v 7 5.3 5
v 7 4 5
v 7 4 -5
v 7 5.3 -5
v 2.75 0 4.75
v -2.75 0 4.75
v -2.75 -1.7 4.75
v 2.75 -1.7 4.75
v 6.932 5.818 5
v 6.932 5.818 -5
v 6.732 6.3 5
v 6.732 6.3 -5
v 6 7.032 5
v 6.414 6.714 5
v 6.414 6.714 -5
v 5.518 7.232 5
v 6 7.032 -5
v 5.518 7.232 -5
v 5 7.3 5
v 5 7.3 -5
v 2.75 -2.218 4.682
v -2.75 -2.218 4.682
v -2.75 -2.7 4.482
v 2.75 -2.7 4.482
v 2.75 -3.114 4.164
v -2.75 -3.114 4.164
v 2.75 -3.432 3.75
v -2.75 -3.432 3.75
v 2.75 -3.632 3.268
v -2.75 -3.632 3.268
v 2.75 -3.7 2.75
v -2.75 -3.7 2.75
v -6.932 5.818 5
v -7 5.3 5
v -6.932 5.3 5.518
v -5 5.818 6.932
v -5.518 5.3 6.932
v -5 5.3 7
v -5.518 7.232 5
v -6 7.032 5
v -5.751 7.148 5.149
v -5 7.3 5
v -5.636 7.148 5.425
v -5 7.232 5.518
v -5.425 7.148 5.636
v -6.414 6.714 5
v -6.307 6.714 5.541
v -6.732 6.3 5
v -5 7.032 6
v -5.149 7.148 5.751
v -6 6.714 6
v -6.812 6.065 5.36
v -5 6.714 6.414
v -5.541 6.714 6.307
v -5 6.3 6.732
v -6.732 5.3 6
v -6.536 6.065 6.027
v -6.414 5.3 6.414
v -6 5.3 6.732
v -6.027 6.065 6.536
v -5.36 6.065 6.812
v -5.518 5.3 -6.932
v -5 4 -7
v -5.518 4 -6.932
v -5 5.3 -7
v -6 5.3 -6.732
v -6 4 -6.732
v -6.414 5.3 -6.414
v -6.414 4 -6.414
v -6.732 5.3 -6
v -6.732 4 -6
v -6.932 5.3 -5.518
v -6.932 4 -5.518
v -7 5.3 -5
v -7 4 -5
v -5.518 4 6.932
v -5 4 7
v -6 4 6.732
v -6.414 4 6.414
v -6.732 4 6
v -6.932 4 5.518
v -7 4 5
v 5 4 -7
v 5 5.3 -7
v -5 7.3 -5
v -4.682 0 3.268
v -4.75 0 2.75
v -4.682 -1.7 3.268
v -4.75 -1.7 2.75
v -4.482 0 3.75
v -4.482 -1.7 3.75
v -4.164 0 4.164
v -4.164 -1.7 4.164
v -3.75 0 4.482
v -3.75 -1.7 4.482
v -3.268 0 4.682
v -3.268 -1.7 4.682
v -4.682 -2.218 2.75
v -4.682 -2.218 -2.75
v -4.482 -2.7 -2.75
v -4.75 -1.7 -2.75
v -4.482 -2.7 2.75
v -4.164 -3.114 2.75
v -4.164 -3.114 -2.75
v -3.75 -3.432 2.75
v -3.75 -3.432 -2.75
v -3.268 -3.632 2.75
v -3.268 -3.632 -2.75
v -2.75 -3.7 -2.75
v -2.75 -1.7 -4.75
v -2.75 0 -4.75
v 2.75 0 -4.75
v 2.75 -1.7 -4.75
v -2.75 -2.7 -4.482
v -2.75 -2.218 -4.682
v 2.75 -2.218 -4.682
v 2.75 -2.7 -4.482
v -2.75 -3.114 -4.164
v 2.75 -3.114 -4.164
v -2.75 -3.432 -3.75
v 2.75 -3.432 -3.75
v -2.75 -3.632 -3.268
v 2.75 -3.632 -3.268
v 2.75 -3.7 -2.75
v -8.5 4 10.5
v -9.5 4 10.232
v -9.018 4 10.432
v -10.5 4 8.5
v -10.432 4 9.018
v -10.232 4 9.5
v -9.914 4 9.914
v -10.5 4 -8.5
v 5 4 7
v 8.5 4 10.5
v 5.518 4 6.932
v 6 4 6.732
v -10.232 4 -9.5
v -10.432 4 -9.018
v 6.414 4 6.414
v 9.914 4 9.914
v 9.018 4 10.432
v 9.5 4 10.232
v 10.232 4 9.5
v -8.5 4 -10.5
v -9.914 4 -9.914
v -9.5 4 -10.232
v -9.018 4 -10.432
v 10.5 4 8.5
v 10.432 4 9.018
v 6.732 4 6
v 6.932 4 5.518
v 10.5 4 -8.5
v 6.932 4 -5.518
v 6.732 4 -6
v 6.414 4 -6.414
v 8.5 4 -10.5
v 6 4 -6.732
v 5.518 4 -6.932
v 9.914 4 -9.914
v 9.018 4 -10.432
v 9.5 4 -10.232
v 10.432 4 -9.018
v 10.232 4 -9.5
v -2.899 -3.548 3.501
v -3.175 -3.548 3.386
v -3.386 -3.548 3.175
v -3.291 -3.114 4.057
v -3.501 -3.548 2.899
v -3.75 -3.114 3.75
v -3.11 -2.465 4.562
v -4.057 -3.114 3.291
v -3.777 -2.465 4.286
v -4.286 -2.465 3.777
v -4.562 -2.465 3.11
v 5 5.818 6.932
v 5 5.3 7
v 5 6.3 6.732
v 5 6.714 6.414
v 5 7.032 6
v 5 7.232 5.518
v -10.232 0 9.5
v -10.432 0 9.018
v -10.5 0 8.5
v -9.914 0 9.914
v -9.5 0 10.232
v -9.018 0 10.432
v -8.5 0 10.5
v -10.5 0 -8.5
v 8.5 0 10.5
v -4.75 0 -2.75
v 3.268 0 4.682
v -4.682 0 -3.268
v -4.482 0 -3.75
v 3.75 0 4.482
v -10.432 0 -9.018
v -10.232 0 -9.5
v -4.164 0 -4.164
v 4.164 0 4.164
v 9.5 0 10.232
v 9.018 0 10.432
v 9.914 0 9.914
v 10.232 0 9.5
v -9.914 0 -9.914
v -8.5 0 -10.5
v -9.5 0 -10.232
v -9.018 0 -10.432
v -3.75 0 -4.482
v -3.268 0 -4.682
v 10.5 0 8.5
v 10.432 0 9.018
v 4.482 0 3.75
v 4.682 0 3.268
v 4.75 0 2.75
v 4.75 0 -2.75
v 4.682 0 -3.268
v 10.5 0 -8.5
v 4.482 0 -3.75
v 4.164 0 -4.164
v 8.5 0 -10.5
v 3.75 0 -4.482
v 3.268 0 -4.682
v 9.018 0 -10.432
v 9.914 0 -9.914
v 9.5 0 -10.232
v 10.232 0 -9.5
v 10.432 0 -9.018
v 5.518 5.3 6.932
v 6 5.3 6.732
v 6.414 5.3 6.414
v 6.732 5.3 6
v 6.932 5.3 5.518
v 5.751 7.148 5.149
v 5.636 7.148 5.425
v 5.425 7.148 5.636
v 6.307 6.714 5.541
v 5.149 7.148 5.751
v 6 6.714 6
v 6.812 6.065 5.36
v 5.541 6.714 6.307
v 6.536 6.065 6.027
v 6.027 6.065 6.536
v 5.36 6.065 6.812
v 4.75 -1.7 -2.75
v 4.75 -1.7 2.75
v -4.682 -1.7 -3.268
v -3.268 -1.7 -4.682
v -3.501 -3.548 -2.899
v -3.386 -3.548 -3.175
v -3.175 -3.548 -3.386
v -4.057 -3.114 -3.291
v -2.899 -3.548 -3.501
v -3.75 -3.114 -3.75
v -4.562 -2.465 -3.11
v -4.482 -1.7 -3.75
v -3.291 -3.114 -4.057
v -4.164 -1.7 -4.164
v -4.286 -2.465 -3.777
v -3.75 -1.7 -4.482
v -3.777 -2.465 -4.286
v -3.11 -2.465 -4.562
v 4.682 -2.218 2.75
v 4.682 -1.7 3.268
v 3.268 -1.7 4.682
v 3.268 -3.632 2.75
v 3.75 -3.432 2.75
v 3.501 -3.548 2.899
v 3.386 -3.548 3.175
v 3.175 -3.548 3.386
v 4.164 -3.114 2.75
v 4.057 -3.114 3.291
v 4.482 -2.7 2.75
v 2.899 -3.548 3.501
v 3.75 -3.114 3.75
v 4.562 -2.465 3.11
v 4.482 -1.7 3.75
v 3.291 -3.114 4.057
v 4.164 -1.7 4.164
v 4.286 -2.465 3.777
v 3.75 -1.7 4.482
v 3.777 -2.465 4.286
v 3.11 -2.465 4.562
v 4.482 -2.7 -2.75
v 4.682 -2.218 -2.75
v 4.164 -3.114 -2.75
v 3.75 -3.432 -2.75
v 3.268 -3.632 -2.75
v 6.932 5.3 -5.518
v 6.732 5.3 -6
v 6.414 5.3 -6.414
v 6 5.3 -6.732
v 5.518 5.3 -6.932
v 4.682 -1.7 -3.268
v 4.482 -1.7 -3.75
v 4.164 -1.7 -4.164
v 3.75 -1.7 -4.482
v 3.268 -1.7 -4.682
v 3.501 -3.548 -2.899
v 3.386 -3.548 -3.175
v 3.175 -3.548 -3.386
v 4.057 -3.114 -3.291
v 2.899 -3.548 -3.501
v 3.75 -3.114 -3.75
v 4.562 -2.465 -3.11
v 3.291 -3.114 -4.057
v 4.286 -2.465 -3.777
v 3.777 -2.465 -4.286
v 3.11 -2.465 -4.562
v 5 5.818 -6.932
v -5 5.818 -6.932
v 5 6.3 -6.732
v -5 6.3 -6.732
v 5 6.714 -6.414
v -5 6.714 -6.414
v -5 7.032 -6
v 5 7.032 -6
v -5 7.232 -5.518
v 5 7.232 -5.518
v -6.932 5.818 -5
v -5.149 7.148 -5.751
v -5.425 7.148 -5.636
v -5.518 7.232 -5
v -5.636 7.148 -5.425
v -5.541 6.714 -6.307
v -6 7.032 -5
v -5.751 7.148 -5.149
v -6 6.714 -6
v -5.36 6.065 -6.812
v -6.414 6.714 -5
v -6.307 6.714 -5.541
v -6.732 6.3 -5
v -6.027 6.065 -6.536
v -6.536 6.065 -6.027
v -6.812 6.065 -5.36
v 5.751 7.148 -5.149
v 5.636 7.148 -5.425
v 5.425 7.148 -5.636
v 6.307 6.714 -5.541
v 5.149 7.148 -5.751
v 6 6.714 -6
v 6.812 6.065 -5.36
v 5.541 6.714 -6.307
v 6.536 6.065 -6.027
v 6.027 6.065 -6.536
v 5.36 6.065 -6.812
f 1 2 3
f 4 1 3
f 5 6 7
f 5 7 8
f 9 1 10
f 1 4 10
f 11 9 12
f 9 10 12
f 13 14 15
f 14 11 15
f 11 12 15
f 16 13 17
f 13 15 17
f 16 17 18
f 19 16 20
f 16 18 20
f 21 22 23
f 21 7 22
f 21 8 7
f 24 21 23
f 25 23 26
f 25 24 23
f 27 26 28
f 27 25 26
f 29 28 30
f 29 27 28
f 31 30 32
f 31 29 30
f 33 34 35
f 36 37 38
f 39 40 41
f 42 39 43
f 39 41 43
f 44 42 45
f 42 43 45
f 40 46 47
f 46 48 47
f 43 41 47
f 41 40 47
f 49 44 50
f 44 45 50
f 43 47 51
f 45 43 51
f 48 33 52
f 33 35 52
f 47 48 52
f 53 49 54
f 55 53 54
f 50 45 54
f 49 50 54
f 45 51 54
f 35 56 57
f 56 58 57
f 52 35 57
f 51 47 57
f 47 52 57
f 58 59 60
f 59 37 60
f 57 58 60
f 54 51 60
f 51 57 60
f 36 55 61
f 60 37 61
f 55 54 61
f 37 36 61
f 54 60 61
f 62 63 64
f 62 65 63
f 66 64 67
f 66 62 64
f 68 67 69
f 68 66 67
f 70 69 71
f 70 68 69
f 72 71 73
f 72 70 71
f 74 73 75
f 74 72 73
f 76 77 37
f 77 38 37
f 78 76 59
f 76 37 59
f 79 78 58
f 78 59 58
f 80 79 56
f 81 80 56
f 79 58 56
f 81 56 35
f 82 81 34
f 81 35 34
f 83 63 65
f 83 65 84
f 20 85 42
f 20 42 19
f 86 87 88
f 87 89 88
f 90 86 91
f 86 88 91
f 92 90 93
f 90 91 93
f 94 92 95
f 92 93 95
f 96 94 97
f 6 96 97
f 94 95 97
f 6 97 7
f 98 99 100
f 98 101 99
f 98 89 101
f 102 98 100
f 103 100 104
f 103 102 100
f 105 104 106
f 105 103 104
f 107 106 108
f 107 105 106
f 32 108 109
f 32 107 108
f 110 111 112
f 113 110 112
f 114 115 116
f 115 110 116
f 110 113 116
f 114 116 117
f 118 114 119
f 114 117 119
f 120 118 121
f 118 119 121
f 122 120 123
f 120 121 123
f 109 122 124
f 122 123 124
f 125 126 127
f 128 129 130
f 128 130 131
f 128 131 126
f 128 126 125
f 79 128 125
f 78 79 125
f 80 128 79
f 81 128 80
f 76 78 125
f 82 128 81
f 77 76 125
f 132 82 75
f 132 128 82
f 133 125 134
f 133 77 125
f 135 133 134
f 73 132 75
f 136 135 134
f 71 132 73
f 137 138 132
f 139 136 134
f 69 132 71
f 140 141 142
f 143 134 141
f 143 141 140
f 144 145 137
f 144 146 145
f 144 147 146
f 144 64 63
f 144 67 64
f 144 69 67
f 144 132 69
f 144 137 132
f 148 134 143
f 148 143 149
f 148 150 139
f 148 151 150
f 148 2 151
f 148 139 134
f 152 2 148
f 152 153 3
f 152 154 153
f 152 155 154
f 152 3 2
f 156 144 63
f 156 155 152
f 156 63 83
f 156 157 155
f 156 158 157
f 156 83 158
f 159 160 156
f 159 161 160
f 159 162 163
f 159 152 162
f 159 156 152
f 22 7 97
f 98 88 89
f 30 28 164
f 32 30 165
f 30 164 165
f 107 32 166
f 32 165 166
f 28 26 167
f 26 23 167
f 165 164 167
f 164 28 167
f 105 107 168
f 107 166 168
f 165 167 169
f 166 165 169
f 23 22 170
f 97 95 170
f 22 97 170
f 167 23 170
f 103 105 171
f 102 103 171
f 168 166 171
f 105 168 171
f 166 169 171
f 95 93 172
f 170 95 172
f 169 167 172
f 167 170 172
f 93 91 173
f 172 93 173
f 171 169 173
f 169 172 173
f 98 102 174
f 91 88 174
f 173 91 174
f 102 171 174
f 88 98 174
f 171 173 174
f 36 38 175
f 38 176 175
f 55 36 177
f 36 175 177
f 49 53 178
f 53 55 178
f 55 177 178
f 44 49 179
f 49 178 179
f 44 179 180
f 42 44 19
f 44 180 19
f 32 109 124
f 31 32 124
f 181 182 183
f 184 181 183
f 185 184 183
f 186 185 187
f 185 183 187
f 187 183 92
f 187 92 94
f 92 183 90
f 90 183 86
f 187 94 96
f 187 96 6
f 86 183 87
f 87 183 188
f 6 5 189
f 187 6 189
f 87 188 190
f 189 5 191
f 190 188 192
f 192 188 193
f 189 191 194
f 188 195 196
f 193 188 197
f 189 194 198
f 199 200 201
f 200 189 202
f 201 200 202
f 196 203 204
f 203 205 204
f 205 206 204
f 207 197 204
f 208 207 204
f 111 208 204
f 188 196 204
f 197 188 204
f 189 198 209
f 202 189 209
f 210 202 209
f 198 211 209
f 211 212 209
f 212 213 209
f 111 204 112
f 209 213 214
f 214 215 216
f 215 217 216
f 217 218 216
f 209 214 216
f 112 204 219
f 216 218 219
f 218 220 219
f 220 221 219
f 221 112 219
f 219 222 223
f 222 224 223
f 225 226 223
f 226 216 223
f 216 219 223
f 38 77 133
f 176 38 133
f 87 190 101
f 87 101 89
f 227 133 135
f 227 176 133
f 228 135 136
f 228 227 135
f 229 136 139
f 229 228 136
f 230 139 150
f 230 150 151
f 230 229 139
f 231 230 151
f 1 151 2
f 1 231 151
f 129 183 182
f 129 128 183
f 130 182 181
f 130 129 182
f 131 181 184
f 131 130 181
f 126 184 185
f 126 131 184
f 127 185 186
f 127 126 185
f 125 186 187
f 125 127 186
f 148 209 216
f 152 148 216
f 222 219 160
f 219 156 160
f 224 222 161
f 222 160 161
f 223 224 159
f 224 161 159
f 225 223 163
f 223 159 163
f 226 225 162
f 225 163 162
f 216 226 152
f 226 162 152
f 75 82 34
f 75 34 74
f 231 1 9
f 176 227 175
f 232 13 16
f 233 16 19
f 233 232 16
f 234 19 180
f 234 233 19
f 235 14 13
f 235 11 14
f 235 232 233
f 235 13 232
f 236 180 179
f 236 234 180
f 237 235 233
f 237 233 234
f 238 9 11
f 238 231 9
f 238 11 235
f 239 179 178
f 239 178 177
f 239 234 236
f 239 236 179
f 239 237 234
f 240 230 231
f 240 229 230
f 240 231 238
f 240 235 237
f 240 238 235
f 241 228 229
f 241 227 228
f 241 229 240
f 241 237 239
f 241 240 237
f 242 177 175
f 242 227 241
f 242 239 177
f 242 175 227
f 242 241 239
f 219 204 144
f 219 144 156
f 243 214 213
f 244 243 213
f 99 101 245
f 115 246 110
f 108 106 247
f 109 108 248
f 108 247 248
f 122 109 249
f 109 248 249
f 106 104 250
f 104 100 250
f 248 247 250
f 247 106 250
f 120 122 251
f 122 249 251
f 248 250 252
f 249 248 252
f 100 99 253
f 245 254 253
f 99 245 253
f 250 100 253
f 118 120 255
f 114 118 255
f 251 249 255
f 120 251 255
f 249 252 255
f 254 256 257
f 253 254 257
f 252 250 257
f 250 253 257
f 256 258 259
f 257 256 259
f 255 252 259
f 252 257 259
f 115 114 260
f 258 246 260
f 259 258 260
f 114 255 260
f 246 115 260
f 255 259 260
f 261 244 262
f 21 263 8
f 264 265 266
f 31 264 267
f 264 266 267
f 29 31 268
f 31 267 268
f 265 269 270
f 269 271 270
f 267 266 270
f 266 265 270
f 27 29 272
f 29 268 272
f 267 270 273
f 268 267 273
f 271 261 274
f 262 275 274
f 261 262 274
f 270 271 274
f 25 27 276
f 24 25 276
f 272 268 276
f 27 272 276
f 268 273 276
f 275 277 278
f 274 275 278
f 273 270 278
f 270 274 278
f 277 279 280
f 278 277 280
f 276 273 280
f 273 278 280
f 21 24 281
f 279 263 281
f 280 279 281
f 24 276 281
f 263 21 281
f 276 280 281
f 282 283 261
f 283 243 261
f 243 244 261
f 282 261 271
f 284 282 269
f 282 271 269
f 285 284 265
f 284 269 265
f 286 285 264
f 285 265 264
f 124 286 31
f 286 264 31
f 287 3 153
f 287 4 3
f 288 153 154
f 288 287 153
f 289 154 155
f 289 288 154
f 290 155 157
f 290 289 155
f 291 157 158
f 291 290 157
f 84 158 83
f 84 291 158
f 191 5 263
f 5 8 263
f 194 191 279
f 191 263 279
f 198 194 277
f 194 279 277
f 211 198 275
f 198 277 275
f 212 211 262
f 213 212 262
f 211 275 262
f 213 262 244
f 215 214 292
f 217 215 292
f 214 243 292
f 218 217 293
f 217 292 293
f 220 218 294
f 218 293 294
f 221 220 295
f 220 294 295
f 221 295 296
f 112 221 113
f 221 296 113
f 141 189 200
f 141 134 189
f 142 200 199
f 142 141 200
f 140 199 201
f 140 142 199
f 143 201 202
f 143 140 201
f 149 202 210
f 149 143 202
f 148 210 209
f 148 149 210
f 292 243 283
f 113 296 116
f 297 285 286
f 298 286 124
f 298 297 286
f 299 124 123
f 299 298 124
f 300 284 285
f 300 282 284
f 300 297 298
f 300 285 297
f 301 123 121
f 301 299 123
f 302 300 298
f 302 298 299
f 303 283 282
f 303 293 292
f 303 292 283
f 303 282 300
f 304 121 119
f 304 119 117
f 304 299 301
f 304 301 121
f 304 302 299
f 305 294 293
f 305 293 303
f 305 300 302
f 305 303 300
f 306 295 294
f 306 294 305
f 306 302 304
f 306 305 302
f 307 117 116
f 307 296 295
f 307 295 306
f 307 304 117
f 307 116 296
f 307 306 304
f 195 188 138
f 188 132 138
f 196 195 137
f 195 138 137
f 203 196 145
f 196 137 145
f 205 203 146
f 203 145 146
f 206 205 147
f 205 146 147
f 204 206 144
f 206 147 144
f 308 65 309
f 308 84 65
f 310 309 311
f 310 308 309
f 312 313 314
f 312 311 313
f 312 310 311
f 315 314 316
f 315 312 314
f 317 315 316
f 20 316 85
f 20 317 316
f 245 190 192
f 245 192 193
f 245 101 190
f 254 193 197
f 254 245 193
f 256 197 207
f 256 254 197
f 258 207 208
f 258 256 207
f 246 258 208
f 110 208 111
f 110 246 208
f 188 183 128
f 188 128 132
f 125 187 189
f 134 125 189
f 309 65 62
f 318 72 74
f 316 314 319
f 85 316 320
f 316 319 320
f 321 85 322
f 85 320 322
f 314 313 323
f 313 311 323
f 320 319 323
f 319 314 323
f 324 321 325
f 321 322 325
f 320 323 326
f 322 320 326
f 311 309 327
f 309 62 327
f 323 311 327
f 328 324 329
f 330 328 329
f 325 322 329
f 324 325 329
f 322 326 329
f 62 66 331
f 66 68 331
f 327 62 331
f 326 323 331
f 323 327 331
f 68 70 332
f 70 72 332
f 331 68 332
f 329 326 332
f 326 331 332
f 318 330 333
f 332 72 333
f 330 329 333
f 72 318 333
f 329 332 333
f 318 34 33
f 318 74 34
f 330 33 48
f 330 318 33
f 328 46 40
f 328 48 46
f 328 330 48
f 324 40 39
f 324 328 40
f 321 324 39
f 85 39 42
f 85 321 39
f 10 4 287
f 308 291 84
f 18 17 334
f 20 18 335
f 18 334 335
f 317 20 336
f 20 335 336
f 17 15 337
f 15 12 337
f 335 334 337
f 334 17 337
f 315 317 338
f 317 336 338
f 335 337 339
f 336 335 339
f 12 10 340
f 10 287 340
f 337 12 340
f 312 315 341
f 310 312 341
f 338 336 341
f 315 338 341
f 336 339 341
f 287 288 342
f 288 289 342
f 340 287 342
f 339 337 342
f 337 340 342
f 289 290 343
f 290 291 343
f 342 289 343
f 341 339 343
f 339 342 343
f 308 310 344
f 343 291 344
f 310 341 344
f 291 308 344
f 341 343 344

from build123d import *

# Parameters (mm, degrees)
SKETCH1_W           = 21
SKETCH1_H           = 21
BOSS_EXTRUDE1_DEPTH = 4
SKETCH2_W           = 9.5
SKETCH2_H           = 9.5
BOSS_EXTRUDE2_DEPTH = 3.7
SKETCH3_W           = 14
SKETCH3_H           = 14
BOSS_EXTRUDE3_DEPTH = 3.3
FILLET1_R           = 2
FILLET2_R           = 2
FILLET3_R           = 2


with BuildPart() as part:
    # Sketch1 → Boss-Extrude1 (new body)
    with BuildSketch(Plane(origin=(0, 0, 0), x_dir=(1, 0, 0), z_dir=(0, 1, 0))):
        Rectangle(SKETCH1_W, SKETCH1_H)
    extrude(amount=BOSS_EXTRUDE1_DEPTH)

    # Sketch2 → Boss-Extrude2 (add)
    with BuildSketch(Plane.XZ):
        Rectangle(SKETCH2_W, SKETCH2_H)
    extrude(amount=BOSS_EXTRUDE2_DEPTH)

    # Sketch3 → Boss-Extrude3 (add)
    with BuildSketch(Plane(origin=(0, 4, 0), x_dir=(1, 0, 0), z_dir=(0, 1, 0))):
        Rectangle(SKETCH3_W, SKETCH3_H)
    extrude(amount=BOSS_EXTRUDE3_DEPTH)

    # Fillet1
    fillet1_edges = [part.edges().sort_by_distance(p)[0] for p in [
        (10.5, 2, 10.5),
        (-10.5, 2, 10.5),
        (-10.5, 2, -10.5),
        (10.5, 2, -10.5),
    ]]
    fillet(fillet1_edges, radius=FILLET1_R)

    # Fillet2
    fillet2_edges = [part.edges().sort_by_distance(p)[0] for p in [
        (7, 5.65, 7),
        (7, 5.65, -7),
        (-7, 5.65, -7),
        (-7, 5.65, 7),
        (7, 7.3, 0),
        (0, 7.3, -7),
        (-7, 7.3, 0),
        (0, 7.3, 7),
    ]]
    fillet(fillet2_edges, radius=FILLET2_R)

    # Fillet3
    fillet3_edges = [part.edges().sort_by_distance(p)[0] for p in [
        (4.75, -1.85, -4.75),
        (4.75, -1.85, 4.75),
        (-4.75, -1.85, 4.75),
        (-4.75, -1.85, -4.75),
        (4.75, -3.7, 0),
        (0, -3.7, 4.75),
        (-4.75, -3.7, 0),
        (0, -3.7, -4.75),
    ]]
    fillet(fillet3_edges, radius=FILLET3_R)


solid = part.part
